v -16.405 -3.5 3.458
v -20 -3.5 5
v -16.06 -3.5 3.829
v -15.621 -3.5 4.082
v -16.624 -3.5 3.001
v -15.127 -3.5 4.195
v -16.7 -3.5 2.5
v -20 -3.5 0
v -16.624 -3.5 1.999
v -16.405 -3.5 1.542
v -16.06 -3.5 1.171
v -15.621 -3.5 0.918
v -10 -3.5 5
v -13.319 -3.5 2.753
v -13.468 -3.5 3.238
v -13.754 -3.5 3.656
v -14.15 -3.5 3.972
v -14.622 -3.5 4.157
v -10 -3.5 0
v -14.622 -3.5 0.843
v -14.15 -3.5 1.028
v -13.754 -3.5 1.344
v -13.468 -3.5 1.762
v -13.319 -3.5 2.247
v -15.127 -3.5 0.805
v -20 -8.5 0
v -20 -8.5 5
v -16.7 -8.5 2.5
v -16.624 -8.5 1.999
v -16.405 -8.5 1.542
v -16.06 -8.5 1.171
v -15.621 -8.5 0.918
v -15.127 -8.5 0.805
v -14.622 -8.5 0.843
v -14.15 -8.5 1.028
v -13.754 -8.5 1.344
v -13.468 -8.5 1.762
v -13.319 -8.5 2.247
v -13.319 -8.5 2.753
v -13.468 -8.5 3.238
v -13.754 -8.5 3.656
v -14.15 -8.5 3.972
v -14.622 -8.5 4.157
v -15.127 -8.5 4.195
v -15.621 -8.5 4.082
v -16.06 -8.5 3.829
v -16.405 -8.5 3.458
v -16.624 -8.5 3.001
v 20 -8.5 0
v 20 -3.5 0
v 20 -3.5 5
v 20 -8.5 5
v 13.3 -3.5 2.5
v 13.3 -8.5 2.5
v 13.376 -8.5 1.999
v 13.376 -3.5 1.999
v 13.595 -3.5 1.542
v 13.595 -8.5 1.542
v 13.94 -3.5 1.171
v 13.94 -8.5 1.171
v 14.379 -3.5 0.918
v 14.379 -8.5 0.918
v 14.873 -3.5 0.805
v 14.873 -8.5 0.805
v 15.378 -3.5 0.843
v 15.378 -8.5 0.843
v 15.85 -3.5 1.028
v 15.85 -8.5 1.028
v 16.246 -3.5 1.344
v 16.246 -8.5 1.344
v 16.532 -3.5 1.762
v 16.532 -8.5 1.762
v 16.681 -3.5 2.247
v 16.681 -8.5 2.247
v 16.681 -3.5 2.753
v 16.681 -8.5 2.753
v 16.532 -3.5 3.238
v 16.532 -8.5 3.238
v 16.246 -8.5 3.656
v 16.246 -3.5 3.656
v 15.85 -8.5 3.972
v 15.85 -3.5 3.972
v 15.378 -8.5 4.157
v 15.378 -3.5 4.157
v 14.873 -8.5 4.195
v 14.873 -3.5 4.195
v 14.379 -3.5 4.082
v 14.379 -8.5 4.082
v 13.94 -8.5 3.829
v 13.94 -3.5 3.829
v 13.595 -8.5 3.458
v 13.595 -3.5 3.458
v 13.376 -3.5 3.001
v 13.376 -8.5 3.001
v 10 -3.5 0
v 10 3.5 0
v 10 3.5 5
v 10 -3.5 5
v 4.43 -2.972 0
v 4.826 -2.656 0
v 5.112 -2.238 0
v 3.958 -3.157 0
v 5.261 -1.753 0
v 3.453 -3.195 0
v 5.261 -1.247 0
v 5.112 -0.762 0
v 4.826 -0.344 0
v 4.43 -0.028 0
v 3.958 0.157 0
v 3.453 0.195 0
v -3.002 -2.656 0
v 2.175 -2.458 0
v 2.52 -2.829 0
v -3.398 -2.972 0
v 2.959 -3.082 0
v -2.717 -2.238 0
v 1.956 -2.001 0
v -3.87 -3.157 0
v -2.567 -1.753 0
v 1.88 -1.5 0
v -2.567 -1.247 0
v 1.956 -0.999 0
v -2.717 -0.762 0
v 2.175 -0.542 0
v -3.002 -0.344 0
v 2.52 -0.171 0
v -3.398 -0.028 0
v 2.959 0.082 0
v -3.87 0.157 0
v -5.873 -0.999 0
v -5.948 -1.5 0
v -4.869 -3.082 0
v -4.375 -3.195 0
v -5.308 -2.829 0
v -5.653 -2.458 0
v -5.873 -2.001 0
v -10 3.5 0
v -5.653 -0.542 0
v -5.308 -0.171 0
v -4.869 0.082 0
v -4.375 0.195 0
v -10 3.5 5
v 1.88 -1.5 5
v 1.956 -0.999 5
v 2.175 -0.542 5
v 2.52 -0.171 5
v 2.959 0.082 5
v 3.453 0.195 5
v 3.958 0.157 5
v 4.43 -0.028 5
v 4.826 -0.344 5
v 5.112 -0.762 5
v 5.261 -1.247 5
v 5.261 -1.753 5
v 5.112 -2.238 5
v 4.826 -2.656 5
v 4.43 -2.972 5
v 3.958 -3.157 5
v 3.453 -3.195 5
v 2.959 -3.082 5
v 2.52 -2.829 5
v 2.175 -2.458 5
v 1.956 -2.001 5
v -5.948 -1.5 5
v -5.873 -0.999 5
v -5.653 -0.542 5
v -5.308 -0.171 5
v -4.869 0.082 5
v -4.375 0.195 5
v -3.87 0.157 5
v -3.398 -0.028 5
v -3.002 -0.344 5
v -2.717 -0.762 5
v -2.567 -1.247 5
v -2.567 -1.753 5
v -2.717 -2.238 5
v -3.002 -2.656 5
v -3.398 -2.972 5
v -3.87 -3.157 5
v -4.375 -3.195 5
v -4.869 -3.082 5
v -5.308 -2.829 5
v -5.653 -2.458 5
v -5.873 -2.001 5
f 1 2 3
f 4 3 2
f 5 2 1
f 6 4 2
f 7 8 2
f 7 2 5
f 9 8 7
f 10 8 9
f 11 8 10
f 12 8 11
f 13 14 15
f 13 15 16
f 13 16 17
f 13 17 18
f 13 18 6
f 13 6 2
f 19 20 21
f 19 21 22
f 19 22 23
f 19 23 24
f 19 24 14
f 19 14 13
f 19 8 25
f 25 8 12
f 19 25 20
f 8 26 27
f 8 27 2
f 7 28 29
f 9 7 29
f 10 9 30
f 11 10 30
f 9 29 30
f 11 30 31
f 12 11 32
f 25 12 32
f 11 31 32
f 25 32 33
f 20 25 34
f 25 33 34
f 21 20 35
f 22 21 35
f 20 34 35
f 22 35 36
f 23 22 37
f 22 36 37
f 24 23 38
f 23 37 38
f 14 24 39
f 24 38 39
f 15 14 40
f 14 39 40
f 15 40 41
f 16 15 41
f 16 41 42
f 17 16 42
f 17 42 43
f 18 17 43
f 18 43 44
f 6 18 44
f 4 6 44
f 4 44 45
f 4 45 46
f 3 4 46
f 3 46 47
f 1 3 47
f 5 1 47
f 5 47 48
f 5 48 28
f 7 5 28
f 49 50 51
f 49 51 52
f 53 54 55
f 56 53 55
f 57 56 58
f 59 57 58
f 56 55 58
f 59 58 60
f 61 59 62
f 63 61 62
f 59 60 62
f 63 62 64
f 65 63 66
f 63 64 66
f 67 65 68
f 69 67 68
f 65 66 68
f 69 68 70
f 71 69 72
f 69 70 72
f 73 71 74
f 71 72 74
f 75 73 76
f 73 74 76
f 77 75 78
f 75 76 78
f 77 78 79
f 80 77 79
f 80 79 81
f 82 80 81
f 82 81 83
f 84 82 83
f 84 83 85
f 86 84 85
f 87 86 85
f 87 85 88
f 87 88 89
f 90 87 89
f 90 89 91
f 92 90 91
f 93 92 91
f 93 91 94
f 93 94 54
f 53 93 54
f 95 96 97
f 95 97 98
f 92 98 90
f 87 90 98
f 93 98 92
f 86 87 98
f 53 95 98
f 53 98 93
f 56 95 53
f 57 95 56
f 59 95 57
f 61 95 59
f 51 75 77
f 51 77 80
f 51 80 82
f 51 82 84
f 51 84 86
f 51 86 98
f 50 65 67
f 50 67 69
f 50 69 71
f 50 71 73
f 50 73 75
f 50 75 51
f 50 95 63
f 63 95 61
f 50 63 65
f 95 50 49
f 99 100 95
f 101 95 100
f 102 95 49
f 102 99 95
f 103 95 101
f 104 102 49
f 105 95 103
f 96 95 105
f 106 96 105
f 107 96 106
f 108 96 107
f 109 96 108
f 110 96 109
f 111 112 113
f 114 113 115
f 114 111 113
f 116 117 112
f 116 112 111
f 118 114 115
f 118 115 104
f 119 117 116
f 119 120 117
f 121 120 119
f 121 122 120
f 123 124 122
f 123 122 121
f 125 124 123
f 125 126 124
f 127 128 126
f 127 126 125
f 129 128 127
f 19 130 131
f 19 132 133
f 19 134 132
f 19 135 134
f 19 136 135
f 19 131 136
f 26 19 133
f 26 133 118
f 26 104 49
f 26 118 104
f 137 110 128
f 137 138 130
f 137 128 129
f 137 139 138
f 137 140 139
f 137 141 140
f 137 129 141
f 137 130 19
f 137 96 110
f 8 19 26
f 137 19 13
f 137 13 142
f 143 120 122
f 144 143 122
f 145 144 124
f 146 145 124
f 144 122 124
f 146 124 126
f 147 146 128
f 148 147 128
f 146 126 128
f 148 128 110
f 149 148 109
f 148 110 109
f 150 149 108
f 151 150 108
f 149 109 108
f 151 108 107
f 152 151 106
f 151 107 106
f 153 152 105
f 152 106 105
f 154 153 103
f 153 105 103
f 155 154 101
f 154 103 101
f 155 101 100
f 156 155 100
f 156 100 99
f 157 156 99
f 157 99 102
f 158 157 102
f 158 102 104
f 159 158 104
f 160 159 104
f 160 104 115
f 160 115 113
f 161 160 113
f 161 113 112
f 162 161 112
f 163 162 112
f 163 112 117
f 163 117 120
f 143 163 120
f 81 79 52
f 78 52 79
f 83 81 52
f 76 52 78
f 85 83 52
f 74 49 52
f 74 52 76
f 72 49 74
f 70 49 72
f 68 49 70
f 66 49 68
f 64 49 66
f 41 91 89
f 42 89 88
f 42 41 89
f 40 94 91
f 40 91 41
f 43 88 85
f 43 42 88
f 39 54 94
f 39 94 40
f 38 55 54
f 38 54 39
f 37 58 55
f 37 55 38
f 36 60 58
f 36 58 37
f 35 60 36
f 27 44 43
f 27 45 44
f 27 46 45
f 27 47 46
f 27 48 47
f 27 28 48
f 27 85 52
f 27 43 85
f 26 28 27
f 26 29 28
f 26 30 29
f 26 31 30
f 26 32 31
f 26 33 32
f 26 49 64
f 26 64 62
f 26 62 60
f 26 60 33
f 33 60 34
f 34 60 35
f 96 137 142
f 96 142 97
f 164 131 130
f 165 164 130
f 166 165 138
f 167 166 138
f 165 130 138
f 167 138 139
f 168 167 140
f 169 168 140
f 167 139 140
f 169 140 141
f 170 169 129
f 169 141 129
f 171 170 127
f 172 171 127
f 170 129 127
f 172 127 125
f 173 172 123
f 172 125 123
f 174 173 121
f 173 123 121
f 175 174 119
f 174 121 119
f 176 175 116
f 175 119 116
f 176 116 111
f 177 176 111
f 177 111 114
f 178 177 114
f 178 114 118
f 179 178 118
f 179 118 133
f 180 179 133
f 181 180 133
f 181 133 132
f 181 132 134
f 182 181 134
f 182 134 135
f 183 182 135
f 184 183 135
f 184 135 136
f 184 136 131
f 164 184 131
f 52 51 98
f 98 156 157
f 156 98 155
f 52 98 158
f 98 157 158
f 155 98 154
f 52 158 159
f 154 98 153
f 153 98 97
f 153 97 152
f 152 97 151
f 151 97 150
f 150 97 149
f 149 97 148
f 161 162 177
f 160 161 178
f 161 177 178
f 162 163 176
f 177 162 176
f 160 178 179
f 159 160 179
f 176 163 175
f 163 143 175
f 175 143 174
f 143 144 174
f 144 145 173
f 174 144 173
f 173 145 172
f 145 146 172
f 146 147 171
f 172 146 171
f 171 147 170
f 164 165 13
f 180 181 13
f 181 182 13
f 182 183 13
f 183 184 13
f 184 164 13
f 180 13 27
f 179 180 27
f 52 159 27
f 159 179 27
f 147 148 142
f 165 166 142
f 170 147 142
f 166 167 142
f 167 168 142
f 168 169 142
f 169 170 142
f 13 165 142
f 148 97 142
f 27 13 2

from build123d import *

# Parameters (mm, degrees)
BOSS_EXTRUDE1_DEPTH = 5
D_GAGEMENT_M31_D    = 3.4
D_GAGEMENT_M32_D    = 3.4


with BuildPart() as part:
    # Sketch1 → Boss-Extrude1 (new body)
    with BuildSketch(Plane.XY):
        Polygon((10, -3.5), (20, -3.5), (20, -8.5), (-20, -8.5), (-20, -3.5), (-10, -3.5), (-10, 3.5), (10, 3.5), align=None)
    extrude(amount=BOSS_EXTRUDE1_DEPTH)

    # Dégagement M31 (through all)
    with Locations(Plane.XY.offset(5)):
        with Locations((3.580019281, -1.5), (-4.248289546, -1.5)):
            Hole(D_GAGEMENT_M31_D / 2)

    # Dégagement M32 (through all)
    with Locations(Plane(origin=(0, -3.5, 0), x_dir=(1, 0, 0), z_dir=(0, 1, 0))):
        with Locations((-15, -2.5), (15, -2.5)):
            Hole(D_GAGEMENT_M32_D / 2)


solid = part.part
